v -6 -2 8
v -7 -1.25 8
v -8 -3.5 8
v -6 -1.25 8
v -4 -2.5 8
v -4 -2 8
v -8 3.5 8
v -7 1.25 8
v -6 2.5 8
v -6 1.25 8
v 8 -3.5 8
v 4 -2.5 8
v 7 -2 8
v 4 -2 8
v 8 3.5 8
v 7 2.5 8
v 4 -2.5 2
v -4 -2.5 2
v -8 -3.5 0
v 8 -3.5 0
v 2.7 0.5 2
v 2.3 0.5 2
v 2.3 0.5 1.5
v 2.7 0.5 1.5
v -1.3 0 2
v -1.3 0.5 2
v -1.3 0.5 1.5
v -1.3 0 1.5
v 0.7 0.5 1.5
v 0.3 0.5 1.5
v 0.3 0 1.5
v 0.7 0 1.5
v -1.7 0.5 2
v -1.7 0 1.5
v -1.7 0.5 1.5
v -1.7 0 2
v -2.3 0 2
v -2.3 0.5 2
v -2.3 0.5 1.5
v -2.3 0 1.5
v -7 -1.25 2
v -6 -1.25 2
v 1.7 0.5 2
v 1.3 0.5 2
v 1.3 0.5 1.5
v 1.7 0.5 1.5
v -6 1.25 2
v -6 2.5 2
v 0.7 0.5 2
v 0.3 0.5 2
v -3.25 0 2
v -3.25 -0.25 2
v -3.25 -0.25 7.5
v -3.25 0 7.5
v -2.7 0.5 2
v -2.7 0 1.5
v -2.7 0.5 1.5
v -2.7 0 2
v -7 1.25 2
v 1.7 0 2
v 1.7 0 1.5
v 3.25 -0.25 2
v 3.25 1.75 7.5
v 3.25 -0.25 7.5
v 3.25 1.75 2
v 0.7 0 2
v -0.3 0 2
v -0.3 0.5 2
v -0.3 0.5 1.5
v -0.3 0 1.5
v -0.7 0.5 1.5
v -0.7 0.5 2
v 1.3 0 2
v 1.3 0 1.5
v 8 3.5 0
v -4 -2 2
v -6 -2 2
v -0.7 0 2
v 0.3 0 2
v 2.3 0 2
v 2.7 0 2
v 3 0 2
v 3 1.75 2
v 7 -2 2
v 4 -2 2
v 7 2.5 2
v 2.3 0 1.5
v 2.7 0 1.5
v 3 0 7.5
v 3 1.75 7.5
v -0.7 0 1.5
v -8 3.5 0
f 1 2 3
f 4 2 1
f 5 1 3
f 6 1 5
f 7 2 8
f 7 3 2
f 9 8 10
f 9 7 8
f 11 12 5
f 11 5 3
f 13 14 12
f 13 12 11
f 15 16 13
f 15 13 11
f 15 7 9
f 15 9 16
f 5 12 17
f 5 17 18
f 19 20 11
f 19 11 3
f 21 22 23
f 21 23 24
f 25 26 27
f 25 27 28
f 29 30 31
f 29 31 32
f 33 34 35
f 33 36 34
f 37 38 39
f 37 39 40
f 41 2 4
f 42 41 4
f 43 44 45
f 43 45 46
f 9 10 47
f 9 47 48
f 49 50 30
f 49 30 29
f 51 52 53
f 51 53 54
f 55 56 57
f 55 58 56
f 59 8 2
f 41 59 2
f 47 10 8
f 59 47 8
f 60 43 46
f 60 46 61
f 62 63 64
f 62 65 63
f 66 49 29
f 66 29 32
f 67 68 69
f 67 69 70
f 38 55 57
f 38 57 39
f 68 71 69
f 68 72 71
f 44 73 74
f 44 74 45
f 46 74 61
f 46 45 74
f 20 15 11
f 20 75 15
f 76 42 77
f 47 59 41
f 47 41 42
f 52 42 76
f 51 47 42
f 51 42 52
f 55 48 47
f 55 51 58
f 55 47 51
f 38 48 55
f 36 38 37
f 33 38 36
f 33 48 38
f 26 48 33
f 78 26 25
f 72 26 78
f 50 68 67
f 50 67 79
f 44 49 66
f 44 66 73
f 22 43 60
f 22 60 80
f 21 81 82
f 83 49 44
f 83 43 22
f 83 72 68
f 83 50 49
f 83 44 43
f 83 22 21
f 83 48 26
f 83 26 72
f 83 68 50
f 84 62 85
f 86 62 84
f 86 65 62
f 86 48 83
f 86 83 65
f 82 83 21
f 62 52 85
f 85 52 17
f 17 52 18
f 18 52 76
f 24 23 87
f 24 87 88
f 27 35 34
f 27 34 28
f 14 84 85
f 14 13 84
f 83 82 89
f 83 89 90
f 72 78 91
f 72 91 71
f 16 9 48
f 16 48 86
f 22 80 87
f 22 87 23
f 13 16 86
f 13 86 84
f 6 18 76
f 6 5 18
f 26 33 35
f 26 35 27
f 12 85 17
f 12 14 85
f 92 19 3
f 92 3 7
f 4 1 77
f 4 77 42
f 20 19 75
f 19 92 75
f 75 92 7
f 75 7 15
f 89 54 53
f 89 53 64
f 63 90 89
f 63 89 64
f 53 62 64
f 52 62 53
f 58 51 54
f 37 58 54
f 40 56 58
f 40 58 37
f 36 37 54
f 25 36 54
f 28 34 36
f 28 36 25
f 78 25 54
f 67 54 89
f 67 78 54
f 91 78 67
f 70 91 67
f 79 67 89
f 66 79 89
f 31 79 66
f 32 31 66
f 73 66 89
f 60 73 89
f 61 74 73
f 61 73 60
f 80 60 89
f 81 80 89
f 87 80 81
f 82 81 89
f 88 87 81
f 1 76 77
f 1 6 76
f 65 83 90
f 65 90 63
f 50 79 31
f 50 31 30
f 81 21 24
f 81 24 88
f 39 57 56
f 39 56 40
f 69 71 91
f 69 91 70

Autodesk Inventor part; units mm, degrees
ref_plane "YZ Plane" through (0, 0, 0) normal (1, 0, 0) x (0, 1, 0)
ref_plane "XZ Plane" through (0, 0, 0) normal (0, 1, 0) x (-1, 0, 0)
ref_plane "XY Plane" through (0, 0, 0) normal (0, 0, 1) x (1, 0, 0)
sketch "Sketch1" plane through (0, 0, 0) normal (0, 0, 1) x (1, 0, 0)
  line L0 (0, 5.6) -> (0, -4.2) projected
  line L1 (-9.6, 0) -> (12.8, 0) projected
  line L2 (-8, 3.5) -> (8, 3.5)
  line L3 (8, 3.5) -> (8, -3.5)
  line L4 (8, -3.5) -> (-8, -3.5)
  line L5 (-8, -3.5) -> (-8, 3.5)
  dimension "d0" = 16
  dimension "d1" = 7
extrude "Extrusion1" add sketch "Sketch1" along normal blind 8
sketch "Sketch2" plane through (0, 0, 8) normal (0, 0, 1) x (1, 0, 0)
  line L0 (8, 3.5) -> (8, -3.5) projected
  line L1 (-6, 2.5) -> (7, 2.5)
  line L2 (7, 2.5) -> (7, -2)
  line L3 (7, -2) -> (-6, -2)
  line L4 (-6, -2) -> (-6, 2.5)
  line L5 (-4, -2) -> (4, -2)
  line L6 (4, -2) -> (4, -2.5)
  line L7 (4, -2.5) -> (-4, -2.5)
  line L8 (-4, -2.5) -> (-4, -2)
  line L9 (-6, 1.25) -> (-7, 1.25)
  line L10 (-7, 1.25) -> (-7, -1.25)
  line L11 (-7, -1.25) -> (-6, -1.25)
  line L12 (-6, -1.25) -> (-6, 1.25)
  line L13 (0, 5.6) -> (0, -4.2) projected
  line L14 (-9.6, 0) -> (12.8, 0) projected
  dimension "d4" = 14
  dimension "d5" = 1
  dimension "d6" = 2.5
  dimension "d7" = 0.5
  dimension "d8" = 5
  dimension "d9" = 1
  dimension "d10" = 8
extrude "Extrusion2" cut sketch "Sketch2" against normal blind 6
sketch "Sketch3" plane through (0, 0, 2) normal (0, 0, 1) x (1, 0, 0)
  line L0 (0, 5.6) -> (0, -4.2) projected
  line L1 (-9.6, 0) -> (12.8, 0) projected
  line L2 (-3.25, 0) -> (3.25, 0)
  line L3 (3.25, 0) -> (3.25, -0.25)
  line L4 (3.25, -0.25) -> (-3.25, -0.25)
  line L5 (-3.25, -0.25) -> (-3.25, 0)
  line L6 (3.25, 0) -> (3, 0)
  line L7 (3, 0) -> (3, 1.75)
  line L8 (3, 1.75) -> (3.25, 1.75)
  line L9 (3.25, 1.75) -> (3.25, 0)
  dimension "d13" = 6.5
  dimension "d14" = 2
  dimension "d15" = 0.25
  dimension "d16" = 0.25
extrude "Extrusion3" add sketch "Sketch3" along normal blind 5.5
sketch "Sketch4" plane through (0, 0, 2) normal (0, 0, 1) x (1, 0, 0)
  line L0 (-3.25, 0) -> (3, 0) projected
  line L1 (3, 0) -> (3, 1.75) projected
  line L2 (2.7, 0) -> (2.3, 0)
  line L3 (2.3, 0) -> (2.3, 0.5)
  line L4 (2.3, 0.5) -> (2.7, 0.5)
  line L5 (2.7, 0.5) -> (2.7, 0)
  dimension "d19" = 0.3
  dimension "d20" = 0.4
  dimension "d21" = 0.5
extrude "Extrusion4" cut sketch "Sketch4" against normal blind 0.5
pattern_linear "Rectangular Pattern1" count 6 spacing 1 along (-1, 0, 0) of "Extrusion4"
equation "\"d15\" = d16"
properties part number "config - j9h2 connector"
